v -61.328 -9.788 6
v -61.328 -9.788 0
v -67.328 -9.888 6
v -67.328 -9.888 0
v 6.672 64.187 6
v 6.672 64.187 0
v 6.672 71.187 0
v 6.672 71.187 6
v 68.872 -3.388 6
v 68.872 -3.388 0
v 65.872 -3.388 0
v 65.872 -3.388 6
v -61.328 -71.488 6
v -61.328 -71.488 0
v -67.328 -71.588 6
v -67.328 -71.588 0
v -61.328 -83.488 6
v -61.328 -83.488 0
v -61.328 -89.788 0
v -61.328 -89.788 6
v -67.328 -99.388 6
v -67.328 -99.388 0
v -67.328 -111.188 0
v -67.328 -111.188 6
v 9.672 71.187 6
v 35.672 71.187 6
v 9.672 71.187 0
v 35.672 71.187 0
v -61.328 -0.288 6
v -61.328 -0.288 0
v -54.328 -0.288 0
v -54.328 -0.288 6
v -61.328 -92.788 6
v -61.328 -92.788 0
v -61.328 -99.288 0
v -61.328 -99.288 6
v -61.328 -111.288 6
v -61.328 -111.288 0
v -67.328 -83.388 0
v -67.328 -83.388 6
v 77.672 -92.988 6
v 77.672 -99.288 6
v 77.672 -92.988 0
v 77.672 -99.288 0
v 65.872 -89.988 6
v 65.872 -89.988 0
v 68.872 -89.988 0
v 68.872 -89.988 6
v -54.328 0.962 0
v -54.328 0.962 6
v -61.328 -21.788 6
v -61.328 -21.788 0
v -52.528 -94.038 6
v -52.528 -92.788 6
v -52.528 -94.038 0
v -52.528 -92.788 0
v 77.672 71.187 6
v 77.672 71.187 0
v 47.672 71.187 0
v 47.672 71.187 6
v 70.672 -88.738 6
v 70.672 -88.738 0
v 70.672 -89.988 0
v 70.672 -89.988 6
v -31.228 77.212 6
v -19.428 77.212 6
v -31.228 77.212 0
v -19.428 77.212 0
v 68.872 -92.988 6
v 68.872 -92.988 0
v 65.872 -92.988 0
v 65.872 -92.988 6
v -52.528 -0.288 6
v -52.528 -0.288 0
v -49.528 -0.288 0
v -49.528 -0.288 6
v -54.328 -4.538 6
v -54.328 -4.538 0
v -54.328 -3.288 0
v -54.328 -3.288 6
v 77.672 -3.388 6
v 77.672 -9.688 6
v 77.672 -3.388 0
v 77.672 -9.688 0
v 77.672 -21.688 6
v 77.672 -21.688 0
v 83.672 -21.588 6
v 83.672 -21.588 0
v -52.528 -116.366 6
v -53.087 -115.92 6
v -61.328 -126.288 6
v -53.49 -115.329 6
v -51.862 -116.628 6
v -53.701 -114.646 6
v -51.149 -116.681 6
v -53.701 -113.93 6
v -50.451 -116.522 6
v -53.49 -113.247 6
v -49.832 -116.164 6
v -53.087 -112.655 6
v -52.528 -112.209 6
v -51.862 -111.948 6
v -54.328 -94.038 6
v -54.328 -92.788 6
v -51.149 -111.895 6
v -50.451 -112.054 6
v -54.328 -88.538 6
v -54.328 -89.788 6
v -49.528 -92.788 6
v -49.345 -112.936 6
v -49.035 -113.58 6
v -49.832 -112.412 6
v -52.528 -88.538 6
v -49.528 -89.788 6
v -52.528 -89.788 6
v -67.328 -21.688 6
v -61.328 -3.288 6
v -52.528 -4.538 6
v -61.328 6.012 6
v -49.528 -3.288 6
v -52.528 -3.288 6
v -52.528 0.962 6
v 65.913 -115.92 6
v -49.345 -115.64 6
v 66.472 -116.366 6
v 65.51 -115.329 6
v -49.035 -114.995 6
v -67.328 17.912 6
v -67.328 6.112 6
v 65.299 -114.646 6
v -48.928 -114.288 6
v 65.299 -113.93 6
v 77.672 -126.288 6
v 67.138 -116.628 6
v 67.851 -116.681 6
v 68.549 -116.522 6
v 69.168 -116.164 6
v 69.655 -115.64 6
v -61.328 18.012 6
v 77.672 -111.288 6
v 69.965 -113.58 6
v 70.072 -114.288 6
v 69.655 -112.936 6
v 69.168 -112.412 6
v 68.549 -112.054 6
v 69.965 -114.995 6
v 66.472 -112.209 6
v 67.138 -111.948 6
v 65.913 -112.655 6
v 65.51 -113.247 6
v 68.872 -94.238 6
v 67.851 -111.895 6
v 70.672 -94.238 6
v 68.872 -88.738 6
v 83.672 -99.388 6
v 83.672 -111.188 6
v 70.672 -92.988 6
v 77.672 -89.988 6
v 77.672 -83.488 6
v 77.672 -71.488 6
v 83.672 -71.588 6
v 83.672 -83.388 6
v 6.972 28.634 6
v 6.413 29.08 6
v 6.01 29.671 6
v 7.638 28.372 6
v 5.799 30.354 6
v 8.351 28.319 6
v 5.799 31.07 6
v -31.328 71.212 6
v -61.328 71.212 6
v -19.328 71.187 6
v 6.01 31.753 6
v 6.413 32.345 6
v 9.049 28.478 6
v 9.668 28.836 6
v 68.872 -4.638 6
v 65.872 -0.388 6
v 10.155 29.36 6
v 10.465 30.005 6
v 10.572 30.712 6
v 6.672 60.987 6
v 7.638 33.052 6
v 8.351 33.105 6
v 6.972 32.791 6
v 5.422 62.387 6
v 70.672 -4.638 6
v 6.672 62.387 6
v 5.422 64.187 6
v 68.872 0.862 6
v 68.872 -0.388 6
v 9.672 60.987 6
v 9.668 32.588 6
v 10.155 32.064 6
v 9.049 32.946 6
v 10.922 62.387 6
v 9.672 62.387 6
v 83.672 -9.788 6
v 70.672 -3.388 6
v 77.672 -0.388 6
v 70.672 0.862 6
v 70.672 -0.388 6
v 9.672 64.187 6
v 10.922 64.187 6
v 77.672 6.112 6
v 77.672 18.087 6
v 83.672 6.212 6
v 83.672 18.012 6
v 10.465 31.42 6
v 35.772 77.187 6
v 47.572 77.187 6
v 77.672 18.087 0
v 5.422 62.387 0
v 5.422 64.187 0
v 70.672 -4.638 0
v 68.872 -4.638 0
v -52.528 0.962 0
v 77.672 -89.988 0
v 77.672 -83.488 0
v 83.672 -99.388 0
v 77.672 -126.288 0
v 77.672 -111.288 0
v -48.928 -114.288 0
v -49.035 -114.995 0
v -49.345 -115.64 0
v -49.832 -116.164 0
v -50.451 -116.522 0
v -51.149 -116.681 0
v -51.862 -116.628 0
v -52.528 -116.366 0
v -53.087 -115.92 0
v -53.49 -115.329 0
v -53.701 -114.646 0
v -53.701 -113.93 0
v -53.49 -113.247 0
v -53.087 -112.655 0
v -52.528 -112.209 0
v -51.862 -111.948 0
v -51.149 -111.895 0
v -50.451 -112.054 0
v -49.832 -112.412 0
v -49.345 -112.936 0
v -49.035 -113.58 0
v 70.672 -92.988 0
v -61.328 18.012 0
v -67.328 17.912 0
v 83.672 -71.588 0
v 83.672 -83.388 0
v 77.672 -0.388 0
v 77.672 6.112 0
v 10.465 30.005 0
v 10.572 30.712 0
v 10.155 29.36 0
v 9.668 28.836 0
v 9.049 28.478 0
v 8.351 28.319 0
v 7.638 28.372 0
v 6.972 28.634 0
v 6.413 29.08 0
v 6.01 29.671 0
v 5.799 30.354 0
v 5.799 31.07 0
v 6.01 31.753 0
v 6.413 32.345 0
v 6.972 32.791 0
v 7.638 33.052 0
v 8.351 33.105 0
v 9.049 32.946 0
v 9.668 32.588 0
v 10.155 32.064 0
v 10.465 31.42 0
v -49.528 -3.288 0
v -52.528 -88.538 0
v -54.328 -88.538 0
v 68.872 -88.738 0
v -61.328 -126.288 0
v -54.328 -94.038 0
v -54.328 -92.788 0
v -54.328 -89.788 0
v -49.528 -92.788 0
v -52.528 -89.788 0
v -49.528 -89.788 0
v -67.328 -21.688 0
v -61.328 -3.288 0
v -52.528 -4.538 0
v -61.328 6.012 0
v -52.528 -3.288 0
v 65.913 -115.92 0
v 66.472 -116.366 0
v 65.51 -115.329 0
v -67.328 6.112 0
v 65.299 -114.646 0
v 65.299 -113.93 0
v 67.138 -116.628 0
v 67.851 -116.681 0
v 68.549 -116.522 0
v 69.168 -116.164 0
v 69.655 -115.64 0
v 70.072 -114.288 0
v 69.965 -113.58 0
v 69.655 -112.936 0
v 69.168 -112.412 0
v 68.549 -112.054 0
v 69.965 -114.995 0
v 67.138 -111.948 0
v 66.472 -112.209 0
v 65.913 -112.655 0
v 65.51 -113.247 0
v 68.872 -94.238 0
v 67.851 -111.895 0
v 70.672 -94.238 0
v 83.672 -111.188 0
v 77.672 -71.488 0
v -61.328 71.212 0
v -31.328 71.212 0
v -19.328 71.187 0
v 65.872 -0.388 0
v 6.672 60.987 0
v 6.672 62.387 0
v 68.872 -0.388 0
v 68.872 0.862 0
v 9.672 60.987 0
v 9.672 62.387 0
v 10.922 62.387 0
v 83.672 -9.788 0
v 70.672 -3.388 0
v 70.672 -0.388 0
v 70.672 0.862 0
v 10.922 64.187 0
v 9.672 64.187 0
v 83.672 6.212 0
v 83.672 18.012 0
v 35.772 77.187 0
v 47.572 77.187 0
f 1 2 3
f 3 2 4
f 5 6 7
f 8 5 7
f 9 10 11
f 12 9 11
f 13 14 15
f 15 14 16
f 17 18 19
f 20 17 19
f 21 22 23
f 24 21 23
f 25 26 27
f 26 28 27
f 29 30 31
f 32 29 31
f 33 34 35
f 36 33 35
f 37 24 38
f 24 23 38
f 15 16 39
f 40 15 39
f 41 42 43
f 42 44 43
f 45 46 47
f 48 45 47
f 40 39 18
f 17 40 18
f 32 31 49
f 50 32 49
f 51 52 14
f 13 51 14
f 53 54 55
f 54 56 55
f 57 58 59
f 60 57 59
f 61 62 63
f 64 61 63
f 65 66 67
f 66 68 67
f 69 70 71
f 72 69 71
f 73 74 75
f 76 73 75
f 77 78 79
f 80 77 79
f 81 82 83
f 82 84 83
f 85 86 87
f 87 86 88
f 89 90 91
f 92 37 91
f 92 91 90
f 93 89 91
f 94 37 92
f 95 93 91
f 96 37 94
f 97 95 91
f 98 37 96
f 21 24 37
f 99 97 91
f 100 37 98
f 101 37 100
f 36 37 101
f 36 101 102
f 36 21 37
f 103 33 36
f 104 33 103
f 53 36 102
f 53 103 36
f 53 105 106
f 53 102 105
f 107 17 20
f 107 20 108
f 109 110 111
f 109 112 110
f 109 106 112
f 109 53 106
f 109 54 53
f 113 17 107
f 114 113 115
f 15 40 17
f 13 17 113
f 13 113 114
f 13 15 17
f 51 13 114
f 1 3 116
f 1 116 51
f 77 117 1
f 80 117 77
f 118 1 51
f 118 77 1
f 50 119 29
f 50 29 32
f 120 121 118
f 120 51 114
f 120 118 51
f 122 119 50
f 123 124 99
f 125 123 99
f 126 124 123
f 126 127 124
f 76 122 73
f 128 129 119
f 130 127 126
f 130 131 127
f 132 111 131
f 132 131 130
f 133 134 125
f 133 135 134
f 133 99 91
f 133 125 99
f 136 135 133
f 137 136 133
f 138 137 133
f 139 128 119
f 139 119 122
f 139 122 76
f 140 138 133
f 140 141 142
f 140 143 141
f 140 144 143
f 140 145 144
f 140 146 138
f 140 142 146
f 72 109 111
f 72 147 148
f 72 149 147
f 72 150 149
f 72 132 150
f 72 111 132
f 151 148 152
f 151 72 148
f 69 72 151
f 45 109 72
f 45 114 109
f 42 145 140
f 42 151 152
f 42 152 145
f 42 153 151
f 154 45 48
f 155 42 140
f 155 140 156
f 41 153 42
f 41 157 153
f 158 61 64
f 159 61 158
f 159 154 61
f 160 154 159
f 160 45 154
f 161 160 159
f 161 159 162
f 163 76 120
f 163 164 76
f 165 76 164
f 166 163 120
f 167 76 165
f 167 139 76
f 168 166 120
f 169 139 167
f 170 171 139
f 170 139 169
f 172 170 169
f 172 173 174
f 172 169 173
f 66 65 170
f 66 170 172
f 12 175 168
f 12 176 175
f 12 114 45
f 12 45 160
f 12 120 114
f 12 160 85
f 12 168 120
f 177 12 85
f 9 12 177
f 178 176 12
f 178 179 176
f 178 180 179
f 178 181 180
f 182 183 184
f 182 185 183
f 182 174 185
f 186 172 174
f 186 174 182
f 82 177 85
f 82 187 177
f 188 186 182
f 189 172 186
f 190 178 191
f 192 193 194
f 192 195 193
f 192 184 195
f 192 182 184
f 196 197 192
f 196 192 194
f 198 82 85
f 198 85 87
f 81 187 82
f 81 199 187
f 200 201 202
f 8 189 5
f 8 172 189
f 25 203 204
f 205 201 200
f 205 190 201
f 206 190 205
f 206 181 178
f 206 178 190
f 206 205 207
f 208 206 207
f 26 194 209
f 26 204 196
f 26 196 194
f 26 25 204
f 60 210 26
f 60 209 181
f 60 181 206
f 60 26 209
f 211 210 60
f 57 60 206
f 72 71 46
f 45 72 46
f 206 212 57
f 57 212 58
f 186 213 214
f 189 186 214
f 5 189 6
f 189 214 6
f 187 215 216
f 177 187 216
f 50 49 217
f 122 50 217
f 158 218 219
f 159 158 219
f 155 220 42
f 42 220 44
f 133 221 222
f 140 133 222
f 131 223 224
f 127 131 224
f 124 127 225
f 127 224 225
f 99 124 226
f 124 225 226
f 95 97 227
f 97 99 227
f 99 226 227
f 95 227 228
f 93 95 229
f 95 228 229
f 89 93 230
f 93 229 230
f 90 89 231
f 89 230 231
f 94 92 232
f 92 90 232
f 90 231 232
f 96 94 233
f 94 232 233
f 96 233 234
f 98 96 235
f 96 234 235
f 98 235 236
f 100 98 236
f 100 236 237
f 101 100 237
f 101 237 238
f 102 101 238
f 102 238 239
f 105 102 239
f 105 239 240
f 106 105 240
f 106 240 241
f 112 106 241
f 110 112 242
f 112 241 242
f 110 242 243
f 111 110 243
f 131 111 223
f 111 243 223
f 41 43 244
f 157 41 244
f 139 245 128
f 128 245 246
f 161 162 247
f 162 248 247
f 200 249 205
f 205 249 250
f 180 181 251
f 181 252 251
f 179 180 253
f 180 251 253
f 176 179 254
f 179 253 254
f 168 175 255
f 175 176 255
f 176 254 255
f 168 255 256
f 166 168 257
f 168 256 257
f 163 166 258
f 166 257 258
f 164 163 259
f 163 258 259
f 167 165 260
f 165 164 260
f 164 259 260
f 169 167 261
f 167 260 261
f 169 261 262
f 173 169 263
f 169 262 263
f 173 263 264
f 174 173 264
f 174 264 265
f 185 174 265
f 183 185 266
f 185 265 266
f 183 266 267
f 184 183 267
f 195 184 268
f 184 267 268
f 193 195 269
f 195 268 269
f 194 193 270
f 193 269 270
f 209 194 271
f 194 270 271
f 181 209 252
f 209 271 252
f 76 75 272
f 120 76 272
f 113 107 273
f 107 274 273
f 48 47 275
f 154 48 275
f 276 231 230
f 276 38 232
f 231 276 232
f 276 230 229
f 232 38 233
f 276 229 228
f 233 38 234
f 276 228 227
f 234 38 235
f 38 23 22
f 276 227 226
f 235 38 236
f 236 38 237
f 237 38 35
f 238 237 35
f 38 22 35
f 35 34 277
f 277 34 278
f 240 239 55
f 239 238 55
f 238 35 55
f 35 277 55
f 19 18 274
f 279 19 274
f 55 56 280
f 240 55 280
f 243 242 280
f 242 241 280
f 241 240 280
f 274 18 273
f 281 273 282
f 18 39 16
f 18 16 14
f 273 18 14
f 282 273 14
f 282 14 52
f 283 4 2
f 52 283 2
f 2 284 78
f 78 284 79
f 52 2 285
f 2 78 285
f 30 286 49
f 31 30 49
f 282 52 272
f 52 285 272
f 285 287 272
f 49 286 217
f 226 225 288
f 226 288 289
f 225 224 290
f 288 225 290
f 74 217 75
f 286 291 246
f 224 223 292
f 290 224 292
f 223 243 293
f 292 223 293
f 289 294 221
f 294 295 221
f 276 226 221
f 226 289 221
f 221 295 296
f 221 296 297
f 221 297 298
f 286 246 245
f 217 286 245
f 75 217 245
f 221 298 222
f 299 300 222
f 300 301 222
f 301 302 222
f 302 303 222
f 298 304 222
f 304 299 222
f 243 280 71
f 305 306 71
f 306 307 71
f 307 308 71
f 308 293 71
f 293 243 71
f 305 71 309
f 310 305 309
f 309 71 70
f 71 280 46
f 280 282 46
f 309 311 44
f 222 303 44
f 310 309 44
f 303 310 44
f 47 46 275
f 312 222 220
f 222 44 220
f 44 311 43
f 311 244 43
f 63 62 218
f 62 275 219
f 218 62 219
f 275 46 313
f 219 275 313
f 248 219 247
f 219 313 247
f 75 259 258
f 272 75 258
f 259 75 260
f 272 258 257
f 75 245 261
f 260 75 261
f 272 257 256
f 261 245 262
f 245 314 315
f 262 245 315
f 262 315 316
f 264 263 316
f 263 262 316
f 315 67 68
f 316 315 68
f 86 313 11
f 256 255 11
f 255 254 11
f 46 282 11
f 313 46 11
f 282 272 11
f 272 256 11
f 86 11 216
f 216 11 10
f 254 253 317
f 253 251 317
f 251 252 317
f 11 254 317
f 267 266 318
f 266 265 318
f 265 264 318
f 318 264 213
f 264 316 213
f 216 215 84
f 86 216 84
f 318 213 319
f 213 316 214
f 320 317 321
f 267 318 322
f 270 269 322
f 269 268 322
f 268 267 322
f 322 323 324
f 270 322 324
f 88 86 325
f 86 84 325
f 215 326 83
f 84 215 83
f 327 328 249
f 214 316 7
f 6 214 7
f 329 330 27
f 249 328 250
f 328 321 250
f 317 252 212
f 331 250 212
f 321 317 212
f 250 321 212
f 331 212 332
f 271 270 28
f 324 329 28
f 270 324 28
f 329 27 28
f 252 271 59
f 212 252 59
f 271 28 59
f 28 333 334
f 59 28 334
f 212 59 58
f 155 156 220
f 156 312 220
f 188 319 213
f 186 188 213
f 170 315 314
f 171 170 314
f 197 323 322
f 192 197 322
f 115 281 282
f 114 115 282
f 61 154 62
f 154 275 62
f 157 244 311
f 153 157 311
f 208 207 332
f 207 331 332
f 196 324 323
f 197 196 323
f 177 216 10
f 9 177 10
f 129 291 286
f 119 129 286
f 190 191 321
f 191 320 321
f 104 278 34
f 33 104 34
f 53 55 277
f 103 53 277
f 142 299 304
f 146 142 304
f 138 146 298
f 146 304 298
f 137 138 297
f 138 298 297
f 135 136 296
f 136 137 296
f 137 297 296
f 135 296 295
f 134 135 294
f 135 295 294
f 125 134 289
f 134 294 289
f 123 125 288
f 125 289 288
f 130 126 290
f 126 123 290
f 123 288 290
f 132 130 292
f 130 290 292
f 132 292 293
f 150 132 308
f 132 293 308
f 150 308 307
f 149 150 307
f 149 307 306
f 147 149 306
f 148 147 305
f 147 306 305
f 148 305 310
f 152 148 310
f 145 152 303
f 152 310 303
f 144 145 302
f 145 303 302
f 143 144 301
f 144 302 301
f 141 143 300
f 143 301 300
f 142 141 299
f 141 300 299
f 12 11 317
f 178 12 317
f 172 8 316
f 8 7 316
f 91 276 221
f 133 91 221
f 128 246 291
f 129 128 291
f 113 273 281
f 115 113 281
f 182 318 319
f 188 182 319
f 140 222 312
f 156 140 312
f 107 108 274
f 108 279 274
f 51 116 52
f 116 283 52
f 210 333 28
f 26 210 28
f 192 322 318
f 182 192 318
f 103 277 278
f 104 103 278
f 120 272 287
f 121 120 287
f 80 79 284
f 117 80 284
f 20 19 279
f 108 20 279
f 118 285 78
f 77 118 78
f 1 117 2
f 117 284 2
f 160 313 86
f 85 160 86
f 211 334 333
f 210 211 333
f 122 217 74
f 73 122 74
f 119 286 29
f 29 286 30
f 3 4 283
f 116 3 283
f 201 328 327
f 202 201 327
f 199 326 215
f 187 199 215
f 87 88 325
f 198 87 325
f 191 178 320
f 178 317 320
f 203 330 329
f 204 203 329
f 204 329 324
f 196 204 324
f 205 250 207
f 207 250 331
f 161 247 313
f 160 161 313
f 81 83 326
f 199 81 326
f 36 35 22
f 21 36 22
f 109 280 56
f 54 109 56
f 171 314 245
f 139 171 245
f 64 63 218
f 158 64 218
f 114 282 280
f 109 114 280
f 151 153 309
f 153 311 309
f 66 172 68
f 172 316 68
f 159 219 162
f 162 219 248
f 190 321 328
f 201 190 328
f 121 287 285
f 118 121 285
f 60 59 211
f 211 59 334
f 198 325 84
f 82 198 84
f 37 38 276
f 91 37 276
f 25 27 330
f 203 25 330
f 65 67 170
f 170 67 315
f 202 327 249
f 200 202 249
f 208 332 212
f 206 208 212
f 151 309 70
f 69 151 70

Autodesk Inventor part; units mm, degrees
ref_plane "YZ Plane" through (0, 0, 0) normal (1, 0, 0) x (0, 1, 0)
ref_plane "XZ Plane" through (0, 0, 0) normal (0, 1, 0) x (-1, 0, 0)
ref_plane "XY Plane" through (0, 0, 0) normal (0, 0, 1) x (1, 0, 0)
sketch "Sketch1" plane through (0, 0, 0) normal (0, 0, 1) x (1, 0, 0)
  circle A0 centre (8.172, 30.7121) radius 2.4
  circle A1 centre (67.672, -114.2879) radius 2.4
  circle A2 centre (-51.328, -114.2879) radius 2.4
  line L0 (-61.328, 71.2121) -> (-61.328, 18.0121)
  line L1 (-61.328, 18.0121) -> (-67.328, 17.9121)
  line L2 (-67.328, 17.9121) -> (-67.328, 6.1121)
  line L3 (-67.328, 6.1121) -> (-61.328, 6.0121)
  line L4 (-61.328, 6.0121) -> (-61.328, -0.2879)
  line L5 (-61.328, -0.2879) -> (-54.328, -0.2879)
  line L6 (-54.328, -0.2879) -> (-54.328, 0.9621)
  line L7 (-54.328, 0.9621) -> (-52.528, 0.9621)
  line L8 (-52.528, 0.9621) -> (-52.528, -0.2879)
  line L9 (-52.528, -0.2879) -> (-49.528, -0.2879)
  line L10 (-49.528, -0.2879) -> (-49.528, -3.2879)
  line L11 (-49.528, -3.2879) -> (-52.528, -3.2879)
  line L12 (-52.528, -3.2879) -> (-52.528, -4.5379)
  line L13 (-52.528, -4.5379) -> (-54.328, -4.5379)
  line L14 (-54.328, -4.5379) -> (-54.328, -3.2879)
  line L15 (-54.328, -3.2879) -> (-61.328, -3.2879)
  line L16 (-61.328, -3.2879) -> (-61.328, -9.7879)
  line L17 (-61.328, -9.7879) -> (-67.328, -9.8879)
  line L18 (-67.328, -9.8879) -> (-67.328, -21.6879)
  line L19 (-67.328, -21.6879) -> (-61.328, -21.7879)
  line L20 (-61.328, -21.7879) -> (-61.328, -71.4879)
  line L21 (-61.328, -71.4879) -> (-67.328, -71.5879)
  line L22 (-67.328, -71.5879) -> (-67.328, -83.3879)
  line L23 (-67.328, -83.3879) -> (-61.328, -83.4879)
  line L24 (-61.328, -83.4879) -> (-61.328, -89.7879)
  line L25 (-61.328, -89.7879) -> (-54.328, -89.7879)
  line L26 (-54.328, -89.7879) -> (-54.328, -88.5379)
  line L27 (-54.328, -88.5379) -> (-52.528, -88.5379)
  line L28 (-52.528, -88.5379) -> (-52.528, -89.7879)
  line L29 (-52.528, -89.7879) -> (-49.528, -89.7879)
  line L30 (-49.528, -89.7879) -> (-49.528, -92.7879)
  line L31 (-49.528, -92.7879) -> (-52.528, -92.7879)
  line L32 (-52.528, -92.7879) -> (-52.528, -94.0379)
  line L33 (-52.528, -94.0379) -> (-54.328, -94.0379)
  line L34 (-54.328, -94.0379) -> (-54.328, -92.7879)
  line L35 (-54.328, -92.7879) -> (-61.328, -92.7879)
  line L36 (-61.328, -92.7879) -> (-61.328, -99.2879)
  line L37 (-61.328, -99.2879) -> (-67.328, -99.3879)
  line L38 (-67.328, -99.3879) -> (-67.328, -111.1879)
  line L39 (-67.328, -111.1879) -> (-61.328, -111.2879)
  line L40 (-61.328, -111.2879) -> (-61.328, -126.2879)
  line L41 (-61.328, -126.2879) -> (77.672, -126.2879)
  line L42 (77.672, -126.2879) -> (77.672, -111.2879)
  line L43 (77.672, -111.2879) -> (83.672, -111.1879)
  line L44 (83.672, -111.1879) -> (83.672, -99.3879)
  line L45 (83.672, -99.3879) -> (77.672, -99.2879)
  line L46 (77.672, -99.2879) -> (77.672, -92.9879)
  line L47 (77.672, -92.9879) -> (70.672, -92.9879)
  line L48 (70.672, -92.9879) -> (70.672, -94.2379)
  line L49 (70.672, -94.2379) -> (68.872, -94.2379)
  line L50 (68.872, -94.2379) -> (68.872, -92.9879)
  line L51 (68.872, -92.9879) -> (65.872, -92.9879)
  line L52 (65.872, -92.9879) -> (65.872, -89.9879)
  line L53 (65.872, -89.9879) -> (68.872, -89.9879)
  line L54 (68.872, -89.9879) -> (68.872, -88.7379)
  line L55 (68.872, -88.7379) -> (70.672, -88.7379)
  line L56 (70.672, -88.7379) -> (70.672, -89.9879)
  line L57 (70.672, -89.9879) -> (77.672, -89.9879)
  line L58 (77.672, -89.9879) -> (77.672, -83.4879)
  line L59 (77.672, -83.4879) -> (83.672, -83.3879)
  line L60 (83.672, -83.3879) -> (83.672, -71.5879)
  line L61 (83.672, -71.5879) -> (77.672, -71.4879)
  line L62 (77.672, -71.4879) -> (77.672, -21.6879)
  line L63 (77.672, -21.6879) -> (83.672, -21.5879)
  line L64 (83.672, -21.5879) -> (83.672, -9.7879)
  line L65 (83.672, -9.7879) -> (77.672, -9.6879)
  line L66 (77.672, -9.6879) -> (77.672, -3.3879)
  line L67 (77.672, -3.3879) -> (70.672, -3.3879)
  line L68 (70.672, -3.3879) -> (70.672, -4.6379)
  line L69 (70.672, -4.6379) -> (68.872, -4.6379)
  line L70 (68.872, -4.6379) -> (68.872, -3.3879)
  line L71 (68.872, -3.3879) -> (65.872, -3.3879)
  line L72 (65.872, -3.3879) -> (65.872, -0.3879)
  line L73 (65.872, -0.3879) -> (68.872, -0.3879)
  line L74 (68.872, -0.3879) -> (68.872, 0.8621)
  line L75 (68.872, 0.8621) -> (70.672, 0.8621)
  line L76 (70.672, 0.8621) -> (70.672, -0.3879)
  line L77 (70.672, -0.3879) -> (77.672, -0.3879)
  line L78 (77.672, -0.3879) -> (77.672, 6.1121)
  line L79 (77.672, 6.1121) -> (83.672, 6.2121)
  line L80 (83.672, 6.2121) -> (83.672, 18.0121)
  line L81 (83.672, 18.0121) -> (77.672, 18.0868)
  line L82 (77.672, 18.0868) -> (77.672, 71.1868)
  line L83 (77.672, 71.1868) -> (47.672, 71.1868)
  line L84 (47.672, 71.1868) -> (47.572, 77.1868)
  line L85 (47.572, 77.1868) -> (35.772, 77.1868)
  line L86 (35.772, 77.1868) -> (35.672, 71.1868)
  line L87 (35.672, 71.1868) -> (9.672, 71.1868)
  line L88 (9.672, 71.1868) -> (9.672, 64.1868)
  line L89 (9.672, 64.1868) -> (10.922, 64.1868)
  line L90 (10.922, 64.1868) -> (10.922, 62.3868)
  line L91 (10.922, 62.3868) -> (9.672, 62.3868)
  line L92 (9.672, 62.3868) -> (9.672, 60.9868)
  line L93 (9.672, 60.9868) -> (6.672, 60.9868)
  line L94 (6.672, 60.9868) -> (6.672, 62.3868)
  line L95 (6.672, 62.3868) -> (5.422, 62.3868)
  line L96 (5.422, 62.3868) -> (5.422, 64.1868)
  line L97 (5.422, 64.1868) -> (6.672, 64.1868)
  line L98 (6.672, 64.1868) -> (6.672, 71.1868)
  line L99 (6.672, 71.1868) -> (-19.328, 71.1868)
  line L100 (-19.328, 71.1868) -> (-19.428, 77.2121)
  line L101 (-19.428, 77.2121) -> (-31.228, 77.2121)
  line L102 (-31.228, 77.2121) -> (-31.328, 71.2121)
  line L103 (-31.328, 71.2121) -> (-61.328, 71.2121)
  point P0 (0, 0)
  point P1 (0, 0)
extrude "Extrusion1" add sketch "Sketch1" along normal blind 6
properties part number "yCarPlate"
